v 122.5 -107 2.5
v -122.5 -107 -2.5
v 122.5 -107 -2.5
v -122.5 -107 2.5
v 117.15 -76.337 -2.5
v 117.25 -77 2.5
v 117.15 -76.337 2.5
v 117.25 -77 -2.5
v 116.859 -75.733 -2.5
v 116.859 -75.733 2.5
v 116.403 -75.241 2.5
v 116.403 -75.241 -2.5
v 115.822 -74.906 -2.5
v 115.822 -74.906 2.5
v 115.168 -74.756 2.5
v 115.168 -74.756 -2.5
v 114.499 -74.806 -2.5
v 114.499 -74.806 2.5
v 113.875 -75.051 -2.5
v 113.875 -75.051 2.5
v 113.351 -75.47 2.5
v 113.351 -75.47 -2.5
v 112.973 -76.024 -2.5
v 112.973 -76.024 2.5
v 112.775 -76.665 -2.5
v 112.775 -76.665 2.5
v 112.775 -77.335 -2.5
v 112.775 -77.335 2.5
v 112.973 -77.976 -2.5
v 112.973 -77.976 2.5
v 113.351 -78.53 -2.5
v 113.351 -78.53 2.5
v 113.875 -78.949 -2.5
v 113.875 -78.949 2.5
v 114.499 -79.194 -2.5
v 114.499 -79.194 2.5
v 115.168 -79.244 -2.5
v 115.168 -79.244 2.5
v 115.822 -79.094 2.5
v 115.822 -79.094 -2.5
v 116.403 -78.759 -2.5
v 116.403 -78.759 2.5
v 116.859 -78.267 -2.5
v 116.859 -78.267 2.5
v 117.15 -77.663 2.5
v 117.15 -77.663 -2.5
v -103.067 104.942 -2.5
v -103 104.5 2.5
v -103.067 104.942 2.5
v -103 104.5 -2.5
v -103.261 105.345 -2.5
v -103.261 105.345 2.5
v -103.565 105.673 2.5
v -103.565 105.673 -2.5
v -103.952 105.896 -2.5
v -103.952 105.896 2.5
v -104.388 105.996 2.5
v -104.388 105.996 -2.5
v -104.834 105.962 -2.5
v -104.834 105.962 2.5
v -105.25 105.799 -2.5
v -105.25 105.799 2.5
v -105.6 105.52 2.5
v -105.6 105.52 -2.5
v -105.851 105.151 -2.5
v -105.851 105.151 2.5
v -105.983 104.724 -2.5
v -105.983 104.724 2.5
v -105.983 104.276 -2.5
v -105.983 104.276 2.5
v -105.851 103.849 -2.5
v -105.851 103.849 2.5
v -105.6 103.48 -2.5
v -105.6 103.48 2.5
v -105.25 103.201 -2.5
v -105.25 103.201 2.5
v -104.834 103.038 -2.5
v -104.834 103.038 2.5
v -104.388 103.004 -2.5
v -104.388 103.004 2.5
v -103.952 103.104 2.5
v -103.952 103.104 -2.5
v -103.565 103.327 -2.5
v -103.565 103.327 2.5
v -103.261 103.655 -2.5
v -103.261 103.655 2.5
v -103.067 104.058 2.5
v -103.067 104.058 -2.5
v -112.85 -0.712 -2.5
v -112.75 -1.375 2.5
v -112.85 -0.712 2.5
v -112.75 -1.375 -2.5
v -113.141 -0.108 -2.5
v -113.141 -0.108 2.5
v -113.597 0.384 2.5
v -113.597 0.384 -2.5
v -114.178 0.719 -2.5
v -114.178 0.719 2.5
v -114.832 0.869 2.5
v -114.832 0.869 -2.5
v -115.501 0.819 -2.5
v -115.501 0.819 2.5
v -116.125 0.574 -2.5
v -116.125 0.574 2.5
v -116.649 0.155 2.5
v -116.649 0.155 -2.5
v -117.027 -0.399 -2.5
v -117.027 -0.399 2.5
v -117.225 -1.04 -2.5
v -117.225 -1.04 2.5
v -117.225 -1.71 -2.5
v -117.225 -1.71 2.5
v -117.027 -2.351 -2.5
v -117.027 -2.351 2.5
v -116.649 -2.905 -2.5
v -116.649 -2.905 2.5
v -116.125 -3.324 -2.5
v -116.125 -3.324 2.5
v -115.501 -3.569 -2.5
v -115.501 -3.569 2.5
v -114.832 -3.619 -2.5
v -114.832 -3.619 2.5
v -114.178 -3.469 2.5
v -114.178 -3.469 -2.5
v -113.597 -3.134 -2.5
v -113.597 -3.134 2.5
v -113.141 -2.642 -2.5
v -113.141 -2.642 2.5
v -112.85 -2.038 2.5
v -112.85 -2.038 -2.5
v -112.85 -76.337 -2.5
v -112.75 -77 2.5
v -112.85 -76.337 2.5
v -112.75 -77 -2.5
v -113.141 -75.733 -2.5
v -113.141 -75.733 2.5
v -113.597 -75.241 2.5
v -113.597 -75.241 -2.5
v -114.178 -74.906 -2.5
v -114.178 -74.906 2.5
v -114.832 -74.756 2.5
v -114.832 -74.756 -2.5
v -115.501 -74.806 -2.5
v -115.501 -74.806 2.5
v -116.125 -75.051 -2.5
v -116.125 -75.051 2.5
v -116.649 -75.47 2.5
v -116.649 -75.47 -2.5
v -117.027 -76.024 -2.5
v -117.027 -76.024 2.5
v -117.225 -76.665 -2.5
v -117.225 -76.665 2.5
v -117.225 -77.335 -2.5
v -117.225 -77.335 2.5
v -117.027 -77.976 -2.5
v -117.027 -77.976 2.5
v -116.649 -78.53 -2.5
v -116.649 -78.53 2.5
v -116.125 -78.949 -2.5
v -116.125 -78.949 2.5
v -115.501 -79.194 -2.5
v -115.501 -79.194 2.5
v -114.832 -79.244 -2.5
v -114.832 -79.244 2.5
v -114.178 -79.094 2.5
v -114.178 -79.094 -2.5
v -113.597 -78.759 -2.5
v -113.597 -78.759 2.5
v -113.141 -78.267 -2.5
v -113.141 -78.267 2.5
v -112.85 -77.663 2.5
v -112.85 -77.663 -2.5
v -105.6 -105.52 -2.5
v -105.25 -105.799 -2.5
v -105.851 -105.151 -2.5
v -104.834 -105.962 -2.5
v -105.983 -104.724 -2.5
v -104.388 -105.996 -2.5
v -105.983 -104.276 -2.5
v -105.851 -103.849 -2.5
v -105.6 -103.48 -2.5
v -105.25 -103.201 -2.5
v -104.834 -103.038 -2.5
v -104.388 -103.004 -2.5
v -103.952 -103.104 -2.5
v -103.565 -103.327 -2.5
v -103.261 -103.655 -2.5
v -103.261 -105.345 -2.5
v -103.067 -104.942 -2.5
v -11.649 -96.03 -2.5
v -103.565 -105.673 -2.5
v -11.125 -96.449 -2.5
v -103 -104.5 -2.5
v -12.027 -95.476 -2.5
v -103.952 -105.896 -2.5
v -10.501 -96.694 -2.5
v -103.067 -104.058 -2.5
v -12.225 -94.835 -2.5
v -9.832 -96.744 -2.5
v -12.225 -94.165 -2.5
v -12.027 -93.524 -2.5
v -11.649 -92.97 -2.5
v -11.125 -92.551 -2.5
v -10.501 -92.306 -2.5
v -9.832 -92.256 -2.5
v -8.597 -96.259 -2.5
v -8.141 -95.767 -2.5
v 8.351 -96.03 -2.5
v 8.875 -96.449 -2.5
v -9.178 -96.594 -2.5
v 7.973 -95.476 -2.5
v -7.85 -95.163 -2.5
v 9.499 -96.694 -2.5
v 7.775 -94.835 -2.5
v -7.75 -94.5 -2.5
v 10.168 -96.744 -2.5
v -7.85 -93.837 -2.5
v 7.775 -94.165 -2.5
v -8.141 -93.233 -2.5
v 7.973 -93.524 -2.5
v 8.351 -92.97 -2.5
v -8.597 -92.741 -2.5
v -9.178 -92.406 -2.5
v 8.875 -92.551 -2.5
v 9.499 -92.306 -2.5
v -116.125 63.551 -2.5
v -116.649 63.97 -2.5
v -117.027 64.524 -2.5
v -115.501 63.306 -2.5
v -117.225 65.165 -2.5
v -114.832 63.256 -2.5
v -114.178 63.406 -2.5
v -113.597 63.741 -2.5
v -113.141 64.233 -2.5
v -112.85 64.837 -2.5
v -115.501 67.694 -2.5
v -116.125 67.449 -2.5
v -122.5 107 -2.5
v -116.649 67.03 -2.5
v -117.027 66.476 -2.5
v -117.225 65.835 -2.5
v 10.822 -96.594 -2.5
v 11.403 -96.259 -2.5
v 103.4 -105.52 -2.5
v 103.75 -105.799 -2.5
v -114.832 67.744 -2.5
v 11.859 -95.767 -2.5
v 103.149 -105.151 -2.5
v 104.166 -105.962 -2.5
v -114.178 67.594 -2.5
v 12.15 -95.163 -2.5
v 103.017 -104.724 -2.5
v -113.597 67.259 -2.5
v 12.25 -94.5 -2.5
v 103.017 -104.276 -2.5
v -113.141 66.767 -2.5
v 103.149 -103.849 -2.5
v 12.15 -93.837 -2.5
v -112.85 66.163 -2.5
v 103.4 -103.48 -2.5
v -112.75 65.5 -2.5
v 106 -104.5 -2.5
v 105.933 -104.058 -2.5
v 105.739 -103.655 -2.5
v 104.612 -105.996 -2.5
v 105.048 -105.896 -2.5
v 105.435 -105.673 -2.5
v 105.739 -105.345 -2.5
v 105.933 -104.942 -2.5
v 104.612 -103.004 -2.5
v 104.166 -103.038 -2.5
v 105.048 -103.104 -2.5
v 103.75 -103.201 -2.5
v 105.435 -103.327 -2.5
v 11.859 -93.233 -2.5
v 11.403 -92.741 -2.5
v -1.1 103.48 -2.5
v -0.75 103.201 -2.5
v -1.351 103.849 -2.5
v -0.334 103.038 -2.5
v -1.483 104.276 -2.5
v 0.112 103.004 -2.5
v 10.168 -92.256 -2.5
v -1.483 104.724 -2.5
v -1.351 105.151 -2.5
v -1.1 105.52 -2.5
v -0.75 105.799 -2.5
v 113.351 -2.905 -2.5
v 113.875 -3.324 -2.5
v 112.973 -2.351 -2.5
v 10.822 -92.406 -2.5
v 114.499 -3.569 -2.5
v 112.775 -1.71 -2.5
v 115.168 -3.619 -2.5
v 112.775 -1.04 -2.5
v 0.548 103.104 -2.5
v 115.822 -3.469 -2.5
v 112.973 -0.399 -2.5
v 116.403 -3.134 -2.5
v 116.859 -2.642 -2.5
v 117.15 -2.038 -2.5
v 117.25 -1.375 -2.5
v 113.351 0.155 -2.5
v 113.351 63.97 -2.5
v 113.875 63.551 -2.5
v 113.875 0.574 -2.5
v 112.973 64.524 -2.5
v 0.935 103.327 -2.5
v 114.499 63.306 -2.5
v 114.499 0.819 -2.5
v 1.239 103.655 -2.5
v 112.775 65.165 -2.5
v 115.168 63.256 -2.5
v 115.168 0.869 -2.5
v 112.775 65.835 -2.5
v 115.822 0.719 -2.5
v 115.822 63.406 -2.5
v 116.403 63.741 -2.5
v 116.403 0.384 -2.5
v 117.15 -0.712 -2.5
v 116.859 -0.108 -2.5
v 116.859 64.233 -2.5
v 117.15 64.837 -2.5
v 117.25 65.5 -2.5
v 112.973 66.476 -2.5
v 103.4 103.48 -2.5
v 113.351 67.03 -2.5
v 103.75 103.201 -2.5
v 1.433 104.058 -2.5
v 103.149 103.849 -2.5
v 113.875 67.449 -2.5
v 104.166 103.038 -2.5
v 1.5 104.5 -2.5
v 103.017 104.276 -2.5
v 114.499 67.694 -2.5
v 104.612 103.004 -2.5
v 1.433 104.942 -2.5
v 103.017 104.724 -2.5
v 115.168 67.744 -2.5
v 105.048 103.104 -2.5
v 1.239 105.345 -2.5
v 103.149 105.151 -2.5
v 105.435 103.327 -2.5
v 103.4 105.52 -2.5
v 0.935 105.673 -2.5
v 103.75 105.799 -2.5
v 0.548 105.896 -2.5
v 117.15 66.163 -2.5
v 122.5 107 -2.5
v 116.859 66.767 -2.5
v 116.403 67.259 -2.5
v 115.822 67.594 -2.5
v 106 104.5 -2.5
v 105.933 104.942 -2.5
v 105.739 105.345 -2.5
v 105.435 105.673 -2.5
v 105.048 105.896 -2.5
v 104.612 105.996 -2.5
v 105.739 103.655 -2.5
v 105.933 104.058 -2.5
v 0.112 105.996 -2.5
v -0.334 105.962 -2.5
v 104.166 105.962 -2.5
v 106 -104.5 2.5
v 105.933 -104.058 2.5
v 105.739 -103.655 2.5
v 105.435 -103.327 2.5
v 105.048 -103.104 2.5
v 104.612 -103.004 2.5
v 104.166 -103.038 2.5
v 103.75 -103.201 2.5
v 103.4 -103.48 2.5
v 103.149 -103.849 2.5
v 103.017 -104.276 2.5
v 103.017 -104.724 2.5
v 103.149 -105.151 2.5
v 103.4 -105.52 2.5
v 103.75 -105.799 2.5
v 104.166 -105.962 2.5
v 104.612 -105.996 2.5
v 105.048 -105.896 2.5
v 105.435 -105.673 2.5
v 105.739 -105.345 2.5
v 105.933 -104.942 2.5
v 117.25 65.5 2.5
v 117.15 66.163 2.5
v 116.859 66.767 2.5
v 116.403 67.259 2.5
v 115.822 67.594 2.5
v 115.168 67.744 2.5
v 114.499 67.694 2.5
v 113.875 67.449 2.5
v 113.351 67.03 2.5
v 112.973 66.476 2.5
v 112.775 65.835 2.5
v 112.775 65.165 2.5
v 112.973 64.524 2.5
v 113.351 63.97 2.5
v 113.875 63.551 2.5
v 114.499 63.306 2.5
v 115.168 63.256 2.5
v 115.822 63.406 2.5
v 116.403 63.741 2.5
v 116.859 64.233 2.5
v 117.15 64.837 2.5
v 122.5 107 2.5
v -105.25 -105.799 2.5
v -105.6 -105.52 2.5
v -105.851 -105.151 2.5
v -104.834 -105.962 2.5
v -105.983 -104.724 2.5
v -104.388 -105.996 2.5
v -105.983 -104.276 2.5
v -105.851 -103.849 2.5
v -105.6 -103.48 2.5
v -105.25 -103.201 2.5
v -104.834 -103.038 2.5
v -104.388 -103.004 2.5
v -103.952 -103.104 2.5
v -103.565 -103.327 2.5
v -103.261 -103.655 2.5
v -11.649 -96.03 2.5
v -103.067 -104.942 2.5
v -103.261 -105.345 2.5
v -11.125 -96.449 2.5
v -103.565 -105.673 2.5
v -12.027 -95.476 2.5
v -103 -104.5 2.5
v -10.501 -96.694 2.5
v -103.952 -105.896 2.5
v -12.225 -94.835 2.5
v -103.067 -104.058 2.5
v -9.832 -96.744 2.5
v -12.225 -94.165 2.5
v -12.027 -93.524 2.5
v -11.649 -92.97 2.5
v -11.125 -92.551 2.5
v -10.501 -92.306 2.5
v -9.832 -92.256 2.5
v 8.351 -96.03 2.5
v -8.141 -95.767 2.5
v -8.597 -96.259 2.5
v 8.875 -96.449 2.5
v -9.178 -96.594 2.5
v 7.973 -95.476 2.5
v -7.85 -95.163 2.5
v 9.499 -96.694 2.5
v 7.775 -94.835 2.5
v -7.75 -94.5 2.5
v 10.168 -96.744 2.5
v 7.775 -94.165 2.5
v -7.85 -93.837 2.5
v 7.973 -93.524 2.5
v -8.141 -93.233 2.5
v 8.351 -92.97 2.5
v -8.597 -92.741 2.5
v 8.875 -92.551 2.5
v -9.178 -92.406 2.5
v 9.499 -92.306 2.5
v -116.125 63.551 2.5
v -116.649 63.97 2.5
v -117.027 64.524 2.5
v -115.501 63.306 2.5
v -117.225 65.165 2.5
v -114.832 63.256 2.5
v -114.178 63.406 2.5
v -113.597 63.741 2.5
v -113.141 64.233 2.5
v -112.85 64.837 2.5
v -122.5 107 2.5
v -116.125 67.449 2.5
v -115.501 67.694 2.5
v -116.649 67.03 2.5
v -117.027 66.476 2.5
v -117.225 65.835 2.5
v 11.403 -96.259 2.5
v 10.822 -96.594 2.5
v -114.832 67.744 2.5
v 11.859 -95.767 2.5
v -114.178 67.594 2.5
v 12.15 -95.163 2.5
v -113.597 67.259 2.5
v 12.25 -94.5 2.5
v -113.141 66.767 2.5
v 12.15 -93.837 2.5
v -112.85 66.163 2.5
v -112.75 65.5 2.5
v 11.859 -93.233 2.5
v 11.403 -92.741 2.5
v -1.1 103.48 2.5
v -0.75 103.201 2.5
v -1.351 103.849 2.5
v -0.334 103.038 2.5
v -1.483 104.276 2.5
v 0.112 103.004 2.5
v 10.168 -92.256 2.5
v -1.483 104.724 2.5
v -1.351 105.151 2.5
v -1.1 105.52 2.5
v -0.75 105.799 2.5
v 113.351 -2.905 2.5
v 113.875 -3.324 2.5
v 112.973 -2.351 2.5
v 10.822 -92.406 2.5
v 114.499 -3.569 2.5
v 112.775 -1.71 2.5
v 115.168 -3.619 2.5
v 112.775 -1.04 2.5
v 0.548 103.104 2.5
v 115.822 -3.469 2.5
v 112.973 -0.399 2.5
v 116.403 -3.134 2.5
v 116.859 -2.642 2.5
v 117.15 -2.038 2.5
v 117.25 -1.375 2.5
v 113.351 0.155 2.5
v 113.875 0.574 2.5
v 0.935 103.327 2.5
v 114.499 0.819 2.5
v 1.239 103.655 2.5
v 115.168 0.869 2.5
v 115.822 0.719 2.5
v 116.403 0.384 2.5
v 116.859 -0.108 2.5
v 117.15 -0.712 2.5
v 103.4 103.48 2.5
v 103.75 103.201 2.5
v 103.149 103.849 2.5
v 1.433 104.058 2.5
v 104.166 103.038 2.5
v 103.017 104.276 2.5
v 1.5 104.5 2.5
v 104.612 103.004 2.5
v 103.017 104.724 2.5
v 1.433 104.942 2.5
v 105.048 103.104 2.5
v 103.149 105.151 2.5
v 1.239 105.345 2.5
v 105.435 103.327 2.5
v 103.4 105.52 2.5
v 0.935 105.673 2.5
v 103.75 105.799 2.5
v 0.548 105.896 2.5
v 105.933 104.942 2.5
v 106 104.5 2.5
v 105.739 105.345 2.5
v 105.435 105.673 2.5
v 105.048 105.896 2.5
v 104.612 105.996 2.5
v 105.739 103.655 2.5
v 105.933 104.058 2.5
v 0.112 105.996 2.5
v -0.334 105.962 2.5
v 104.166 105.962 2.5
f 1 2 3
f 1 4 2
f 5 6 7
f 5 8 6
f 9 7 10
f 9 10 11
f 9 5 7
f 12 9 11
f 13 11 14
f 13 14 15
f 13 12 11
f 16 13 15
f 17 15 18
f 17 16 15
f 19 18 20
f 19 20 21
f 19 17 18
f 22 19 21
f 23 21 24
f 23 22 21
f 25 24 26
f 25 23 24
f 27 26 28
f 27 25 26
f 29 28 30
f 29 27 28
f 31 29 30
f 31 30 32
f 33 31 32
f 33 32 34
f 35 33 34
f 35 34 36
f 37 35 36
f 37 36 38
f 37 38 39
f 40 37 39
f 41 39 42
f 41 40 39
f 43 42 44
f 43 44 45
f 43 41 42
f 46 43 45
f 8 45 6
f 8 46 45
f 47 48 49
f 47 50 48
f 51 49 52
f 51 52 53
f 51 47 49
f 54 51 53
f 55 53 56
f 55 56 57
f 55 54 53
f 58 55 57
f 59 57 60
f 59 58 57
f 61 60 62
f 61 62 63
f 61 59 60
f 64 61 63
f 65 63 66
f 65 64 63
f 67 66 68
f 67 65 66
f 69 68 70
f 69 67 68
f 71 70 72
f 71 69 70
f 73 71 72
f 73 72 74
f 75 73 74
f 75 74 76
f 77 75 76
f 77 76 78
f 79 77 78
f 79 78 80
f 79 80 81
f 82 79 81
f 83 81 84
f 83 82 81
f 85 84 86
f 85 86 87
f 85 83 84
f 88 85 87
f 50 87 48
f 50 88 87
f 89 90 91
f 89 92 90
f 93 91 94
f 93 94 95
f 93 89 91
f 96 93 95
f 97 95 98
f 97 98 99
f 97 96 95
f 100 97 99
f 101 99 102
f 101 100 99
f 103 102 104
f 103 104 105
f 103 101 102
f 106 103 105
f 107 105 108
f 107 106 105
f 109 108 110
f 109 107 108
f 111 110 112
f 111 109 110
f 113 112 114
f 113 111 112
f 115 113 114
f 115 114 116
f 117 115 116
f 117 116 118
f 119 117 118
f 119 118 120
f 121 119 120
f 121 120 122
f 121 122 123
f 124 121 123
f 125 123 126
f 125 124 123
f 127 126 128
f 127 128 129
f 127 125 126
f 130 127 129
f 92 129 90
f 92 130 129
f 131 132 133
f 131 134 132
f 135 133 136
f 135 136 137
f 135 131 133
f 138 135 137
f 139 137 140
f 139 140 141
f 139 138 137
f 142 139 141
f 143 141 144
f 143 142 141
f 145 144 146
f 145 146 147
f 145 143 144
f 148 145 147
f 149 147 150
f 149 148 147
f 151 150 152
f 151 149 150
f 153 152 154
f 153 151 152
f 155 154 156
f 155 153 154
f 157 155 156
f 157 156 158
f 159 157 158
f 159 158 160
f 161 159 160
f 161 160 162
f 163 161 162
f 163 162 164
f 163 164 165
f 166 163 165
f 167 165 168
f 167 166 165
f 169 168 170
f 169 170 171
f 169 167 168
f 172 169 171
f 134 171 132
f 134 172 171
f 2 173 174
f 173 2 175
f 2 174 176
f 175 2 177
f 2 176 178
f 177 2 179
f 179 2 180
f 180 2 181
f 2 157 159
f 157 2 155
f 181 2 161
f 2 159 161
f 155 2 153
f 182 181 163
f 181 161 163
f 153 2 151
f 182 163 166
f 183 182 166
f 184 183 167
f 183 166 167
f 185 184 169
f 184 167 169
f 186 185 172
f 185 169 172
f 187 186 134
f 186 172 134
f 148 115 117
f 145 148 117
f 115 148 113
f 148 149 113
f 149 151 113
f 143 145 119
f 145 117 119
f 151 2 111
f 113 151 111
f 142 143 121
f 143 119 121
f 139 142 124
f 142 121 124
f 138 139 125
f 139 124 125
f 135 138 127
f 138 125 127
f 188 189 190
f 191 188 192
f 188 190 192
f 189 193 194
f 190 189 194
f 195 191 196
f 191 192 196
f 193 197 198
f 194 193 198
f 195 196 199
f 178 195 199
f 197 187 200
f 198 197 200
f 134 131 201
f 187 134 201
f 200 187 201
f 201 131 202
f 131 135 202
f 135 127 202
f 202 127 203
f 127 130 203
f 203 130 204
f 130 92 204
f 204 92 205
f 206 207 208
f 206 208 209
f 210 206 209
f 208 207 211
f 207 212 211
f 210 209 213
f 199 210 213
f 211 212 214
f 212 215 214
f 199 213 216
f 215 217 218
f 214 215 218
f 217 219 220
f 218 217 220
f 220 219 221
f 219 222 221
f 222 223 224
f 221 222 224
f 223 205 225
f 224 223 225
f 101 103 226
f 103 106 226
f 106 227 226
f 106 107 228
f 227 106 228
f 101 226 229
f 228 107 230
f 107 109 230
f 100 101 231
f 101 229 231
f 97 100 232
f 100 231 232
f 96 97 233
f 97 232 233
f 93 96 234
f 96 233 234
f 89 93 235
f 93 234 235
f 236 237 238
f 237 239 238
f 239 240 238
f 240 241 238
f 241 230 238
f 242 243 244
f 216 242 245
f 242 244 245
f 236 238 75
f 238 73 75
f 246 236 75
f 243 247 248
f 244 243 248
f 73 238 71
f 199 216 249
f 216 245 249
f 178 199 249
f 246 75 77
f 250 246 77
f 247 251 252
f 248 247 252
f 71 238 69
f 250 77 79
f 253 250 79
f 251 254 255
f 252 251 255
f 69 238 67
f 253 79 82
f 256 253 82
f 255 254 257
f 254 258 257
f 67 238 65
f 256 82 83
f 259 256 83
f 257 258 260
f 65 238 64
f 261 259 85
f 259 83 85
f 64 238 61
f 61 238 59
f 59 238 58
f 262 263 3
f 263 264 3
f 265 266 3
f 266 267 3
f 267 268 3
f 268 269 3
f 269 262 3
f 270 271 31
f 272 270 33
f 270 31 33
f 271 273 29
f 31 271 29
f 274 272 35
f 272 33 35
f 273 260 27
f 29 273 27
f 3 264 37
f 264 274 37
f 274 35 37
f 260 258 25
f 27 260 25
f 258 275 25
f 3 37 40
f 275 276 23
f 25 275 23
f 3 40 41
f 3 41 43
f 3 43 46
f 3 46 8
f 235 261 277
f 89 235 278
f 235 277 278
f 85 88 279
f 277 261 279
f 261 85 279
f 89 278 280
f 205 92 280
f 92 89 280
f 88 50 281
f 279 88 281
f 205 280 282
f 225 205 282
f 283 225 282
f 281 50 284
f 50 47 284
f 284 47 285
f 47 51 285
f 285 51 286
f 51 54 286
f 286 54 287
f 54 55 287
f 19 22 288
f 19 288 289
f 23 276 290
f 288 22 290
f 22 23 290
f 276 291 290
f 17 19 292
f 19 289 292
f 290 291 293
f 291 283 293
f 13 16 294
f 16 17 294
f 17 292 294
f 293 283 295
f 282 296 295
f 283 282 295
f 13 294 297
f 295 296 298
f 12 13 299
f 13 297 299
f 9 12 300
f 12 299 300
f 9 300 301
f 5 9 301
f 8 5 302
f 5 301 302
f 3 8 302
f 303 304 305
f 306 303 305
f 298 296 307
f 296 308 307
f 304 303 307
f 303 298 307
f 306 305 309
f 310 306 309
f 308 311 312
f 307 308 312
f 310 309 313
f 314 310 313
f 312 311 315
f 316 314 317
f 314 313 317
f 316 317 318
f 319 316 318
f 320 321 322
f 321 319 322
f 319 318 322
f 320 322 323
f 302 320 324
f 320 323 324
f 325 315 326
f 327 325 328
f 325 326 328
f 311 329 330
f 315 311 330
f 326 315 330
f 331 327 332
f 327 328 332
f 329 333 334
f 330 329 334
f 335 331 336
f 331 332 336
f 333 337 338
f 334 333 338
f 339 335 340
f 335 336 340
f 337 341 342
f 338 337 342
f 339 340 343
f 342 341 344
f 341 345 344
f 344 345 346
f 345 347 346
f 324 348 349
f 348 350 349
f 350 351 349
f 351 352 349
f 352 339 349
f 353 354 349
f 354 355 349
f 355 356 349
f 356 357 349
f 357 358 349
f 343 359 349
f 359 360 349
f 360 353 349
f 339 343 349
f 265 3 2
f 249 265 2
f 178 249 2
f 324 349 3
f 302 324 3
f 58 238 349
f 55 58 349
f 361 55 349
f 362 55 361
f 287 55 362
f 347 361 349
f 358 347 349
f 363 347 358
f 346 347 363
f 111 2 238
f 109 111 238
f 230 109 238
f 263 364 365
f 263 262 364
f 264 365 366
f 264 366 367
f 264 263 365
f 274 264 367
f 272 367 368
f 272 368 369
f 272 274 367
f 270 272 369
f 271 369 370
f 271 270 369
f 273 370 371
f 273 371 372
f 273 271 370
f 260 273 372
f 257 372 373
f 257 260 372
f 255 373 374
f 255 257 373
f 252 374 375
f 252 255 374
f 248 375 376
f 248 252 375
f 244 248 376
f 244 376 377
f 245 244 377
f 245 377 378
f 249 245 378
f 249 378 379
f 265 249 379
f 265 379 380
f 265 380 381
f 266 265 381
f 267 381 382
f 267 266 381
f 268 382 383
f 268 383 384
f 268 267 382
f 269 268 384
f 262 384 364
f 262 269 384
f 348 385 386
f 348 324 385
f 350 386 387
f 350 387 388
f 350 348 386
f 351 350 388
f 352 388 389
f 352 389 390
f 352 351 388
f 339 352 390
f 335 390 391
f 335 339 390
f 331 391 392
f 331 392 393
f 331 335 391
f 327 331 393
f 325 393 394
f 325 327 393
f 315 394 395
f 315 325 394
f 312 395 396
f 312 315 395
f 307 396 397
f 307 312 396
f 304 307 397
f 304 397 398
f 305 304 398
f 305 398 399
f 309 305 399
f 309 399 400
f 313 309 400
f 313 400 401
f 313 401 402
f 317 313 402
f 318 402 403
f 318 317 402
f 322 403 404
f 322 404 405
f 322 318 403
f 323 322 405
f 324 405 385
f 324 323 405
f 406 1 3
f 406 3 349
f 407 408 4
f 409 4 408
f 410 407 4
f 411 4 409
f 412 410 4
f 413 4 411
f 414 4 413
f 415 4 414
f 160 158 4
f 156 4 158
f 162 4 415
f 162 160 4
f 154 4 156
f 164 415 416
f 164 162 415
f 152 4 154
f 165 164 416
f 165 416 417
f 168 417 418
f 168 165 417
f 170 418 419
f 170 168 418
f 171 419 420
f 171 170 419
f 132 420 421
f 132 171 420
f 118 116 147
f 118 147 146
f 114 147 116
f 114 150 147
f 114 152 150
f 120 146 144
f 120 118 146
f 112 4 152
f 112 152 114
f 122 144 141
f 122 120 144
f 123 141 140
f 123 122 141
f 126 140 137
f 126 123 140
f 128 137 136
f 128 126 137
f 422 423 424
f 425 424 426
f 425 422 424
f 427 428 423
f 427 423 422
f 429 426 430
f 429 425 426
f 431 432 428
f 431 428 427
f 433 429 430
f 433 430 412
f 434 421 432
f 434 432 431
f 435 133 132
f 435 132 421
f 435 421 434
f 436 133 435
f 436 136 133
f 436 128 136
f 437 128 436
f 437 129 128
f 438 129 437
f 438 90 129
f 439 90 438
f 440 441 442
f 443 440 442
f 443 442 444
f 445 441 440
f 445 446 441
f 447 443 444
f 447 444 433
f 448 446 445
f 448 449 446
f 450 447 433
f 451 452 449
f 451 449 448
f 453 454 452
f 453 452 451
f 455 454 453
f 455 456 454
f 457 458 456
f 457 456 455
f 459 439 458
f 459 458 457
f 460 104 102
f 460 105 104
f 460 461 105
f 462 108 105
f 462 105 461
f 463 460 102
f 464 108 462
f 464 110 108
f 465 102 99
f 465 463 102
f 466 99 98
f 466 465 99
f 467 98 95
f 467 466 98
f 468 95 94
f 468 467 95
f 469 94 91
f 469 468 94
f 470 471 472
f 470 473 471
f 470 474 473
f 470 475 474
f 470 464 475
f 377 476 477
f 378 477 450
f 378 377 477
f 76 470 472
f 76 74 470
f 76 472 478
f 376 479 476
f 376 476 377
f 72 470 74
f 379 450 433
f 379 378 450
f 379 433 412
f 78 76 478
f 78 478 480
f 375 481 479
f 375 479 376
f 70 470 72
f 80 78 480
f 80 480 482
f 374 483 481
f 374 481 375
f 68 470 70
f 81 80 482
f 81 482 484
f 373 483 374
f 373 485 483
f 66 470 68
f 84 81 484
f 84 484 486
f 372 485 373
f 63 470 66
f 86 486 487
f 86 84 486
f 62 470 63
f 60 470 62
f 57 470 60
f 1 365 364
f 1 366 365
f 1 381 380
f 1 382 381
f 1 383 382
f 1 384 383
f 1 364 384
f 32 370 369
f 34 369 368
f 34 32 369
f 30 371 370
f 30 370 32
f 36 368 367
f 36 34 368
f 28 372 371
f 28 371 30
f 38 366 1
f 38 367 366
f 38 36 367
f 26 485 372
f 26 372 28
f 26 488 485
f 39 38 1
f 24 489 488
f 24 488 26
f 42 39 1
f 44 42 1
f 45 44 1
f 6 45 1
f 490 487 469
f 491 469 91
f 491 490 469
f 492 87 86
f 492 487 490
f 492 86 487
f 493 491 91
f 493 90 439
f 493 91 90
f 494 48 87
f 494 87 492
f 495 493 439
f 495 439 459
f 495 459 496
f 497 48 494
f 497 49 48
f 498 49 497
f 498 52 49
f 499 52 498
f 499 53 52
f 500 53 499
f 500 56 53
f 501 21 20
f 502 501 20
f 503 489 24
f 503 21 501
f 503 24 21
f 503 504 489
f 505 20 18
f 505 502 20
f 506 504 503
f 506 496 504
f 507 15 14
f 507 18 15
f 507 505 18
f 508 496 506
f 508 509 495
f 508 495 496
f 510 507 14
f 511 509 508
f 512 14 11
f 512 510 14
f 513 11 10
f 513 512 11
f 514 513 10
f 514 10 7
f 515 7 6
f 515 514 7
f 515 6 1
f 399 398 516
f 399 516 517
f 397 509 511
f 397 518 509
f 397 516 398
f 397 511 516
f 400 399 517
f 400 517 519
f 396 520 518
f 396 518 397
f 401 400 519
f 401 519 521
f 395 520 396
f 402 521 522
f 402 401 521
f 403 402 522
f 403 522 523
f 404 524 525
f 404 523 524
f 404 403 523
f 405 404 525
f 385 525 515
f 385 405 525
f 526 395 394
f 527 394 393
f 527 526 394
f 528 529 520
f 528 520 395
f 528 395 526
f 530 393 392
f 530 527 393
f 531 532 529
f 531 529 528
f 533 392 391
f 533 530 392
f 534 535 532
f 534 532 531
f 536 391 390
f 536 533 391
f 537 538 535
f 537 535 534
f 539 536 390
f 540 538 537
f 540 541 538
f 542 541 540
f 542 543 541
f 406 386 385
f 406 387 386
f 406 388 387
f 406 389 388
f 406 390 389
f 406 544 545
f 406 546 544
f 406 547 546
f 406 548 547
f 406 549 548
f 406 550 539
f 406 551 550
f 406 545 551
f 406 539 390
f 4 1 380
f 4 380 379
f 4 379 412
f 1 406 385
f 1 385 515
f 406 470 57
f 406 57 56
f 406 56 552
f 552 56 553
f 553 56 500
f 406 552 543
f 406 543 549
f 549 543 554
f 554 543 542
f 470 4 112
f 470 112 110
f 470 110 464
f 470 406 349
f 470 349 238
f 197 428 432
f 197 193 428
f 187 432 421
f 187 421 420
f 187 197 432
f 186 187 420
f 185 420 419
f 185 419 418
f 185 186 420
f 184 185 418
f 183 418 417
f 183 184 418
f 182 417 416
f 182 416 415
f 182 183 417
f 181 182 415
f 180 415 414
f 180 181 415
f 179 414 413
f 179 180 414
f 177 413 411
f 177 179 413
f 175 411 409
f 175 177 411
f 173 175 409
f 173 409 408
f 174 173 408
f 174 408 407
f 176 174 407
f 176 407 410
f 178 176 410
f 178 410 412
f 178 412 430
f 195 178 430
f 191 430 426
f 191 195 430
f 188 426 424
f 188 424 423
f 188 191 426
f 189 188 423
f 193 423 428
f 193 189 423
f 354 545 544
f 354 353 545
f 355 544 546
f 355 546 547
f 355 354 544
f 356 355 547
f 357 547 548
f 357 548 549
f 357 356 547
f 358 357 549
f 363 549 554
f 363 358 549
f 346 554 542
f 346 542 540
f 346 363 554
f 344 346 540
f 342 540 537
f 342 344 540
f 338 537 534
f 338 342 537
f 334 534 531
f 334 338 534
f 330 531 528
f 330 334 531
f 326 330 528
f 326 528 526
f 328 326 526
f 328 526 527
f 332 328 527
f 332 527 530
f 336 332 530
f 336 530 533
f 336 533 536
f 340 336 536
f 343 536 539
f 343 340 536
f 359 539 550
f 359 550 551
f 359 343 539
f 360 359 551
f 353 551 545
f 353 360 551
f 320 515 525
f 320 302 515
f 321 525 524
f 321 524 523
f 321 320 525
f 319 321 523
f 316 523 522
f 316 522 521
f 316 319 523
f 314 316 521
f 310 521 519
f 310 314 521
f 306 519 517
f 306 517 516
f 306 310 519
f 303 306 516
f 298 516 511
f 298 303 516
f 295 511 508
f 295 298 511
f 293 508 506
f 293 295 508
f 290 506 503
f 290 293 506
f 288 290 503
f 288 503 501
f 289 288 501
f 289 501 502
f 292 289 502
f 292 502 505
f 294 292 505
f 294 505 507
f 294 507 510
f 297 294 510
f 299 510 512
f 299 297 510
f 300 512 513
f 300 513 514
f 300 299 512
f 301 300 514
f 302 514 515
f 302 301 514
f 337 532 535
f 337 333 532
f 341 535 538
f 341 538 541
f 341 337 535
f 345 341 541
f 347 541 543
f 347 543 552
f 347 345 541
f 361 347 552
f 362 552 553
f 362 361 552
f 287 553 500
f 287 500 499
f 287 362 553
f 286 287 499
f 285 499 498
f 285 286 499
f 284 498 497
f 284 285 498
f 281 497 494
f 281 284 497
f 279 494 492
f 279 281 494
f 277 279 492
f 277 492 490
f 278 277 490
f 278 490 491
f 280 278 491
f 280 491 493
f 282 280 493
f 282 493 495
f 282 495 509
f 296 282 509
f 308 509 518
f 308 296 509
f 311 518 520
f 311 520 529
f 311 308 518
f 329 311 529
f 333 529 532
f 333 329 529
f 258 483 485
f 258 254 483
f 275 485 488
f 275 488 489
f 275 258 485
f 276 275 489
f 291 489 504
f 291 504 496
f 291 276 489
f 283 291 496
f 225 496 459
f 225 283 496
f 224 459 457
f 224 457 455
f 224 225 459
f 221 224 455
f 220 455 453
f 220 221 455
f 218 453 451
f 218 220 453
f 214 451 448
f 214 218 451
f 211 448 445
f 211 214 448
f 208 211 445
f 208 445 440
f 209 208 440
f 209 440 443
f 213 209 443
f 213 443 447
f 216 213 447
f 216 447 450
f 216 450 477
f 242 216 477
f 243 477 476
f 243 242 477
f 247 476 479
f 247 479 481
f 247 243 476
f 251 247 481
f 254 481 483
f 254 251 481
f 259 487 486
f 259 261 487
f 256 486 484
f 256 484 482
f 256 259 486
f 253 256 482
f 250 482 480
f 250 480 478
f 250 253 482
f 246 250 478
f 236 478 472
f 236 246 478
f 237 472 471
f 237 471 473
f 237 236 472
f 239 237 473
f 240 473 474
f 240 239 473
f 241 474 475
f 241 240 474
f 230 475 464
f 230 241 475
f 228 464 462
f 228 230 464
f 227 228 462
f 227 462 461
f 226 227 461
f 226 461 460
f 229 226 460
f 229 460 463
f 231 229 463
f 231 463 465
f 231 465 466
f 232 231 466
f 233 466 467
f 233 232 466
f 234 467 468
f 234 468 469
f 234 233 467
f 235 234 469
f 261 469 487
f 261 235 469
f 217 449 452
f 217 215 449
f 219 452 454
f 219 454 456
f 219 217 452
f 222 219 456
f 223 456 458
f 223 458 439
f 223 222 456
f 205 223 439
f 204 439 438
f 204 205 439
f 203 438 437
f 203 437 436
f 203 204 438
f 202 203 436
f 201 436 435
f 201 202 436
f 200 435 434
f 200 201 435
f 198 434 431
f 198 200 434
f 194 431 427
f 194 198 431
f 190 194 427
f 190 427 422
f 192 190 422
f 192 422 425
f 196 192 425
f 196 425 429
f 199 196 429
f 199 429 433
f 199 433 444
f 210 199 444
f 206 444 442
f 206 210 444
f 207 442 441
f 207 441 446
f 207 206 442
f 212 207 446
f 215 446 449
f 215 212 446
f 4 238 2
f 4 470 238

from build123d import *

# Parameters (mm, degrees)
F0_R     = 1.5
F0_R_2   = 2.25
F1_DEPTH = 2.5


with BuildPart() as f1:
    # F0 (on Top) → F1 (new body, symmetric)
    with BuildSketch(Plane.XY):
        Polygon((-122.5, -107), (122.5, -107), (122.5, 0.95), (122.5, 107), (-122.5, 107), (-122.5, 0.95), align=None)
        with Locations((-104.5, -104.5)):
            Circle(F0_R, mode=Mode.SUBTRACT)
        with Locations((-115, -77)):
            Circle(F0_R_2, mode=Mode.SUBTRACT)
        with Locations((-10, -94.5)):
            Circle(F0_R_2, mode=Mode.SUBTRACT)
        with Locations((-115, -1.375)):
            Circle(F0_R_2, mode=Mode.SUBTRACT)
        with Locations((10, -94.5)):
            Circle(F0_R_2, mode=Mode.SUBTRACT)
        with Locations((104.5, -104.5)):
            Circle(F0_R, mode=Mode.SUBTRACT)
        with Locations((115, -77)):
            Circle(F0_R_2, mode=Mode.SUBTRACT)
        with Locations((115, -1.375)):
            Circle(F0_R_2, mode=Mode.SUBTRACT)
        with Locations((-115, 65.5)):
            Circle(F0_R_2, mode=Mode.SUBTRACT)
        with Locations((-104.5, 104.5)):
            Circle(F0_R, mode=Mode.SUBTRACT)
        with Locations((0, 104.5)):
            Circle(F0_R, mode=Mode.SUBTRACT)
        with Locations((115, 65.5)):
            Circle(F0_R_2, mode=Mode.SUBTRACT)
        with Locations((104.5, 104.5)):
            Circle(F0_R, mode=Mode.SUBTRACT)
    extrude(amount=F1_DEPTH, both=True)


solid = f1.part
